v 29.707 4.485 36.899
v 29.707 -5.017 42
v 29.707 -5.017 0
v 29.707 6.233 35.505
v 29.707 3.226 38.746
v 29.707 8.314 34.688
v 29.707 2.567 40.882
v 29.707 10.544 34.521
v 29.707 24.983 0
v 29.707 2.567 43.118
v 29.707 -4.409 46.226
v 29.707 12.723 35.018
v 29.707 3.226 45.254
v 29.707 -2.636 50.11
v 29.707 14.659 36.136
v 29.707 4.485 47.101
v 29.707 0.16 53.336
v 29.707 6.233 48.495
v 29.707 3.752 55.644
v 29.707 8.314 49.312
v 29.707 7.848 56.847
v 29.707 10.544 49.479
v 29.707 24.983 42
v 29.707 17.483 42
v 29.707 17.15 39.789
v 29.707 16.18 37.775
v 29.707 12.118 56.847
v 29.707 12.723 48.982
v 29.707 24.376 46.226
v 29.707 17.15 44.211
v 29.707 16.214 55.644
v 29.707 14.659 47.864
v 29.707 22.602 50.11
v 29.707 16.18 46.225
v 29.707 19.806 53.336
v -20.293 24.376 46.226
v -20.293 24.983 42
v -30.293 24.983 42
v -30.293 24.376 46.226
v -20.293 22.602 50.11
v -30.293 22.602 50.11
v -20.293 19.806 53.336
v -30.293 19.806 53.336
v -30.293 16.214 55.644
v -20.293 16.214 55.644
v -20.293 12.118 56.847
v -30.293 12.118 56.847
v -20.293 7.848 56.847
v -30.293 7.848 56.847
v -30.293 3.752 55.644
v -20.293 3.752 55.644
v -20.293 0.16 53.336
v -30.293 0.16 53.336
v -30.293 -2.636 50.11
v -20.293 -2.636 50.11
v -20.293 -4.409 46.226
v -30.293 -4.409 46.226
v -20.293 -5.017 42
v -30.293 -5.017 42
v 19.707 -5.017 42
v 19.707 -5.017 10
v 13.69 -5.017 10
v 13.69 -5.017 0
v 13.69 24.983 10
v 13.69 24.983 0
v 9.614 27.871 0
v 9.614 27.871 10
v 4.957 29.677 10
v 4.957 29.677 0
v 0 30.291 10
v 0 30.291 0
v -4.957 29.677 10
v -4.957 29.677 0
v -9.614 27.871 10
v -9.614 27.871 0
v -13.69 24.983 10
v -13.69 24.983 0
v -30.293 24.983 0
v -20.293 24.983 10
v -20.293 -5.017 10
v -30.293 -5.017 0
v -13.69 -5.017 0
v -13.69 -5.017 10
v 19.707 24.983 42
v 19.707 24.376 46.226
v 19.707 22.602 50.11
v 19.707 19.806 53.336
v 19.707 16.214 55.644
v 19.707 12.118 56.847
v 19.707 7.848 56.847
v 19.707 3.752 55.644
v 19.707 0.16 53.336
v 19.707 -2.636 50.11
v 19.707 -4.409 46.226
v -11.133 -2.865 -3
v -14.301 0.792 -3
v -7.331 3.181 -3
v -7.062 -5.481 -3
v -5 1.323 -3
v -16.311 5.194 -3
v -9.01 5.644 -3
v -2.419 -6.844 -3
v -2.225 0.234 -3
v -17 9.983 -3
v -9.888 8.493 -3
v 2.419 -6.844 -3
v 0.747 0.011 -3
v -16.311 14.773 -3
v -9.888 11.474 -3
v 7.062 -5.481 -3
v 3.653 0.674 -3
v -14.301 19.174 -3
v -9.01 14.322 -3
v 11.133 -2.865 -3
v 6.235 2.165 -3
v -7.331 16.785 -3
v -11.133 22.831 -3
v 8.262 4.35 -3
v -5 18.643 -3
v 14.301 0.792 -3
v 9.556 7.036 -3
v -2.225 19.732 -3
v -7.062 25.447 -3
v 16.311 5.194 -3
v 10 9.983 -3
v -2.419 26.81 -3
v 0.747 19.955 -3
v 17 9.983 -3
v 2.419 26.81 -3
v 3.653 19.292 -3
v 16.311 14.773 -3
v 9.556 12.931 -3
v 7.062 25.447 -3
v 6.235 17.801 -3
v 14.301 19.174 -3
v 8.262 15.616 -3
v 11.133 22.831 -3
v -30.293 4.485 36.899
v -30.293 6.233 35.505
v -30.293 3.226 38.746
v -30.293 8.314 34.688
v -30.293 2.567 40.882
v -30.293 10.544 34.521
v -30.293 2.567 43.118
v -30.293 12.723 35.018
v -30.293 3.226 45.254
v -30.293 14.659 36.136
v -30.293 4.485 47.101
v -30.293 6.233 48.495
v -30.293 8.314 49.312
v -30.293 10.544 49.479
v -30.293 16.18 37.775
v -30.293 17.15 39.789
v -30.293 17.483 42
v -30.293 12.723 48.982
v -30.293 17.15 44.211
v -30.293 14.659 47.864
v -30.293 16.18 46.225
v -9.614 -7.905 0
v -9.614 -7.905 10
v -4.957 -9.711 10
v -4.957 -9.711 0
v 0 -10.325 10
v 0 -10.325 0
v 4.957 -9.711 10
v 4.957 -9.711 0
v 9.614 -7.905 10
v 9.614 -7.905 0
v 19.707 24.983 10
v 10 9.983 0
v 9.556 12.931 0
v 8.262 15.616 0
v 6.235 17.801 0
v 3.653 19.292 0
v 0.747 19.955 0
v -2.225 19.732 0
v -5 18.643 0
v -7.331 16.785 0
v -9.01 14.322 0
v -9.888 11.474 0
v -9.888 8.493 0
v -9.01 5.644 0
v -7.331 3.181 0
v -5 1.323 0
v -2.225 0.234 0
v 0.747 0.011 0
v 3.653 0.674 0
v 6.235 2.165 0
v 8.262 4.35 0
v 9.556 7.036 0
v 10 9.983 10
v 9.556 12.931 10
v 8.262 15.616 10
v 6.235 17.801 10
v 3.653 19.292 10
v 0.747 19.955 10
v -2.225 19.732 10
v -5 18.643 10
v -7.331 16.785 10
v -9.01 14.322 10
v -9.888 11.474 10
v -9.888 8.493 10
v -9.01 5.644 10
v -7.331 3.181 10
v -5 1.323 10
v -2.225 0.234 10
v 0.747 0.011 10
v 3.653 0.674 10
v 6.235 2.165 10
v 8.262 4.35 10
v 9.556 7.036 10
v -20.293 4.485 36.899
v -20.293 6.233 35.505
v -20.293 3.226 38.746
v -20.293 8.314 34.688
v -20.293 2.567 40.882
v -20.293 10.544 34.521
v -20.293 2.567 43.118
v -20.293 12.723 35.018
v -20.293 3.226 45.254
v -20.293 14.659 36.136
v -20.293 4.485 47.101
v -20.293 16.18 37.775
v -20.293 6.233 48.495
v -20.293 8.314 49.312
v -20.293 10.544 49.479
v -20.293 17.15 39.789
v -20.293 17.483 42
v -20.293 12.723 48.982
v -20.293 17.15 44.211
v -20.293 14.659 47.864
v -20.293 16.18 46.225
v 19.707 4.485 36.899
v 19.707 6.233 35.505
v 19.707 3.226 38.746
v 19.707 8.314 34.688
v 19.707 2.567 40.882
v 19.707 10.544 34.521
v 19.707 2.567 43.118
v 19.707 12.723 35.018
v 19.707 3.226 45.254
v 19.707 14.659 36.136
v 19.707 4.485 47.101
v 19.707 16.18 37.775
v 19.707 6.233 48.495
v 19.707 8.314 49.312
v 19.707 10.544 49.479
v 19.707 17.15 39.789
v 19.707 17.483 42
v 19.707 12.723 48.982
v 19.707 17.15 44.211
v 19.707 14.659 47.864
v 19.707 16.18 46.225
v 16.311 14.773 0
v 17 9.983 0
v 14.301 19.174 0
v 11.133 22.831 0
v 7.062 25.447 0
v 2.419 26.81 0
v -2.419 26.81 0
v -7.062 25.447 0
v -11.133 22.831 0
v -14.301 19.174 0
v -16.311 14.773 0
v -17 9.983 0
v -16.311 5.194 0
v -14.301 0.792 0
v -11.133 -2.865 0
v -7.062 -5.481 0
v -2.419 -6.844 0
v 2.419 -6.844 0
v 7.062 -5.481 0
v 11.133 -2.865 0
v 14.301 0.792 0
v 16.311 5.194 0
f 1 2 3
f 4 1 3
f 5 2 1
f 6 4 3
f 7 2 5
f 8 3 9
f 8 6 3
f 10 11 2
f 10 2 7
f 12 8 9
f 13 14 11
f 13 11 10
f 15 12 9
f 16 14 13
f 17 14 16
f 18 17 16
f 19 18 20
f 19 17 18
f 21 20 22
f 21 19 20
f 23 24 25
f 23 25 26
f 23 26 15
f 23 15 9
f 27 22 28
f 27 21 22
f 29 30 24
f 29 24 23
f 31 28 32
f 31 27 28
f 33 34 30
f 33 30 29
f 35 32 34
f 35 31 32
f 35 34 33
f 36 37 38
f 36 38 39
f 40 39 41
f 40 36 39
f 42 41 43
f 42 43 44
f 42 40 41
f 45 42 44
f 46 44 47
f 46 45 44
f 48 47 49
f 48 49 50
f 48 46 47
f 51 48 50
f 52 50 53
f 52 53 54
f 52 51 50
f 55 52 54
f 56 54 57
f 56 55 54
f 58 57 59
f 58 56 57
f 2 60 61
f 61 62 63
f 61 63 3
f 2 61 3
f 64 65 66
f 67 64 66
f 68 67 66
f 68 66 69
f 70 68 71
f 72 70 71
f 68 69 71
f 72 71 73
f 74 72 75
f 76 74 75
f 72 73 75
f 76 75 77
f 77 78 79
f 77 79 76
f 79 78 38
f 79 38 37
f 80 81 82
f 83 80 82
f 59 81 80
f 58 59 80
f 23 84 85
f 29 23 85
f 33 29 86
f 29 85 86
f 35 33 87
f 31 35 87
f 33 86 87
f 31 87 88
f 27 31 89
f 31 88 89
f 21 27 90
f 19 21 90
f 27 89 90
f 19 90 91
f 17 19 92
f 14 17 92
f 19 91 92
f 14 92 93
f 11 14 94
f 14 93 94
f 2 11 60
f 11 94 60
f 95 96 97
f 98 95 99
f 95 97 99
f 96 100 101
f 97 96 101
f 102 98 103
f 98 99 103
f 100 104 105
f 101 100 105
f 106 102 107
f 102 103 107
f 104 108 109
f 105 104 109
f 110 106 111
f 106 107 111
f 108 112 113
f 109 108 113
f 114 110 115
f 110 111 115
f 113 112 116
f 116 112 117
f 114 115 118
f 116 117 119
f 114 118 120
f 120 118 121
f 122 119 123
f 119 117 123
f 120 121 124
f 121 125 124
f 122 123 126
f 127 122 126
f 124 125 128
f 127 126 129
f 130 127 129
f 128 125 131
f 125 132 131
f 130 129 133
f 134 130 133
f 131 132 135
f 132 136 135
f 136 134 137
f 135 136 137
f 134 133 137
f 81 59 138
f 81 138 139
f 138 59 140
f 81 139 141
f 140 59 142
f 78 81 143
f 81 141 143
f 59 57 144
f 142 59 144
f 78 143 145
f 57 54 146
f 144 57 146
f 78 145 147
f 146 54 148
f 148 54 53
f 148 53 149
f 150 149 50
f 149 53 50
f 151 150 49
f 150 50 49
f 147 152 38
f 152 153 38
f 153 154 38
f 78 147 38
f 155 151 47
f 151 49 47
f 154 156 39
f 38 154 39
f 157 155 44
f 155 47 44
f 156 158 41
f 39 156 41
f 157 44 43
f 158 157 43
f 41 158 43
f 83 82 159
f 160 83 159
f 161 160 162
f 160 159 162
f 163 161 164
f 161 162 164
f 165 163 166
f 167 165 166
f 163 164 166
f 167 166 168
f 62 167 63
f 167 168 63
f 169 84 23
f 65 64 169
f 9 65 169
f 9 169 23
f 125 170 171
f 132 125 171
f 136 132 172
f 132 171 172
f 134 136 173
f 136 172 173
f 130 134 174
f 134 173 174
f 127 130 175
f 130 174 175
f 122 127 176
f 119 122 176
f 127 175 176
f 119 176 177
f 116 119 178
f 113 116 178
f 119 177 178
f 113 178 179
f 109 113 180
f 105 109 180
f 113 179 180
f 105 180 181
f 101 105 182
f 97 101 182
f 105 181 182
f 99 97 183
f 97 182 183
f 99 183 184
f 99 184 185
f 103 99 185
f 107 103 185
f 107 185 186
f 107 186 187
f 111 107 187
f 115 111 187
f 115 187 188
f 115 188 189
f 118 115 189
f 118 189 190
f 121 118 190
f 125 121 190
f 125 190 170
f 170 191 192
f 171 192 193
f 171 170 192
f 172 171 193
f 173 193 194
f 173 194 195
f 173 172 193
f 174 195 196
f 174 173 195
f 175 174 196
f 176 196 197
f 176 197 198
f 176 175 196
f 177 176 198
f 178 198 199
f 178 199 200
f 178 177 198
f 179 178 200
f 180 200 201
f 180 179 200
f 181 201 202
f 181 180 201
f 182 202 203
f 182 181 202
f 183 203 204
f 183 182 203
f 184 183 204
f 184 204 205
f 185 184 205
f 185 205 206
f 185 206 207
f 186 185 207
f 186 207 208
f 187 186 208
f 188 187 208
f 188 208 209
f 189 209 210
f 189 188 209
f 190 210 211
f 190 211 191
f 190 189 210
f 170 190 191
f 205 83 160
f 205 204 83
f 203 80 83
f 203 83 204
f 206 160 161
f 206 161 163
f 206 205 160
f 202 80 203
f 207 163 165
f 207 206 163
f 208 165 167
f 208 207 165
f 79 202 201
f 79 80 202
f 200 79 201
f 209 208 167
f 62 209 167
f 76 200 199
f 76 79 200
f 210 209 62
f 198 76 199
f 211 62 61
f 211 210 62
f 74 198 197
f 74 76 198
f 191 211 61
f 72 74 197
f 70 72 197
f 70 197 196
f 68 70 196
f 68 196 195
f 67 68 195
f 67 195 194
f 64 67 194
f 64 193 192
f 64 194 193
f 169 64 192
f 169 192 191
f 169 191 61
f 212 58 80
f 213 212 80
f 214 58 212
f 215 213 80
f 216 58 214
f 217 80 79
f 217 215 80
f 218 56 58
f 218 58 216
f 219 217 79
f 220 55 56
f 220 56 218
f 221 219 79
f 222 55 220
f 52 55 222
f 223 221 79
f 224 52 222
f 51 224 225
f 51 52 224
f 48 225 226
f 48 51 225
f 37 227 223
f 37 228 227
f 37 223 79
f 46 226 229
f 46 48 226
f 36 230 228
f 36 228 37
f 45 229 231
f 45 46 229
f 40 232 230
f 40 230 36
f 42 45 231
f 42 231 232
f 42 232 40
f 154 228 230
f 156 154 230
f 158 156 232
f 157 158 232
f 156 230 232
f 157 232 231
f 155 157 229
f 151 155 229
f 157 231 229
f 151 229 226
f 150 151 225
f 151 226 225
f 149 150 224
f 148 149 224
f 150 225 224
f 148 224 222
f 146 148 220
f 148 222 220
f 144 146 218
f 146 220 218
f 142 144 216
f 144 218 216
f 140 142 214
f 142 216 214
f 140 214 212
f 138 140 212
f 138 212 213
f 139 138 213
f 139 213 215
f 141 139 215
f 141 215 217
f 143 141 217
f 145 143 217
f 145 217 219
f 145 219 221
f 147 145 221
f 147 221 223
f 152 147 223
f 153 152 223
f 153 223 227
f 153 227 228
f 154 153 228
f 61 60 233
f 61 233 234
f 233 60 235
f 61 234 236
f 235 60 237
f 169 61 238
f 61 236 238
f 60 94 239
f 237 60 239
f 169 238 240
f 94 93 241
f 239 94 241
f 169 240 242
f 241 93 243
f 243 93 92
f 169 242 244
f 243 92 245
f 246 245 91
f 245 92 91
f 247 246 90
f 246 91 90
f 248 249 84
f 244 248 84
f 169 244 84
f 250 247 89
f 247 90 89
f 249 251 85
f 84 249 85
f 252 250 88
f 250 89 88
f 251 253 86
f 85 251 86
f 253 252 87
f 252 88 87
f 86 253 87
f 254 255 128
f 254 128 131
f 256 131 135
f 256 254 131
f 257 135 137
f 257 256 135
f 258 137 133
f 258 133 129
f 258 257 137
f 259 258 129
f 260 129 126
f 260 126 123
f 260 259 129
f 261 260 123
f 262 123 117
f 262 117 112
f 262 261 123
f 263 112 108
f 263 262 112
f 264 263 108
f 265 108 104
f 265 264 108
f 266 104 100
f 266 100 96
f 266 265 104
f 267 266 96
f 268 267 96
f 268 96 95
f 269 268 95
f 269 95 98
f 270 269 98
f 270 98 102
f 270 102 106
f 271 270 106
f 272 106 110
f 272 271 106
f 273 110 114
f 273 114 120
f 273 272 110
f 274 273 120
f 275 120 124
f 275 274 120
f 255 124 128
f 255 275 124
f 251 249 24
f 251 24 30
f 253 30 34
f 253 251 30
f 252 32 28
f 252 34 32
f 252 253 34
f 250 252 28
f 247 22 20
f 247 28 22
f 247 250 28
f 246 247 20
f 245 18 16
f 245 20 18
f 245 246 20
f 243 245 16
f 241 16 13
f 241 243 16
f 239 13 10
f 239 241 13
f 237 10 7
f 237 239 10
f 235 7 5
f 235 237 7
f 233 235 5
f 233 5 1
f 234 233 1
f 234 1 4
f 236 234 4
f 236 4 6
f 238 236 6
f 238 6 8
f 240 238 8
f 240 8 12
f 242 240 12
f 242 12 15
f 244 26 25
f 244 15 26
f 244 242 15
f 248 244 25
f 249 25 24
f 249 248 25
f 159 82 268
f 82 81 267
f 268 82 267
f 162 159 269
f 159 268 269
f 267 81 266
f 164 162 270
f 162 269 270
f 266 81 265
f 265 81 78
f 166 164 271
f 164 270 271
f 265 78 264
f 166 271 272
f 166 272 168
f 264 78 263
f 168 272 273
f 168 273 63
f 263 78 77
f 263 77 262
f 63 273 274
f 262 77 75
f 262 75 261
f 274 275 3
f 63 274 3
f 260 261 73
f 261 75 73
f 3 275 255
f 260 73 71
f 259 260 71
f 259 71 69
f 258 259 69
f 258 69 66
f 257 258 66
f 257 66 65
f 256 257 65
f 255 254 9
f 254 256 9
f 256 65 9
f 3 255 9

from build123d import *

# Parameters (mm, degrees)
F0_W           = 60
F0_H           = 30
F1_DEPTH       = 10
F2_R           = 10
F3_DEPTH       = 10
F4_R           = 10
F5_DEPTH       = 10
F5_DEPTH_BACK  = 17.75
F6_R           = 17
F7_DEPTH       = 3
F8_R           = 10
F9_DEPTH       = 25
F10_W          = 10
F10_H          = 32
F11_DEPTH      = 5.0168695525
F11_DEPTH_BACK = 24.9831304475
F13_START      = 19.7067023069
F13_DEPTH      = 10
F14_START      = -20.2932976931
F14_DEPTH      = 10
F15_R          = 7.5
F16_DEPTH      = 44.75
F16_DEPTH_BACK = 50.75


with BuildPart() as f1:
    # F0 (on Top) → F1 (new body)
    with BuildSketch(Plane.XY):
        with Locations((-0.2932976931, 9.9831304475)):
            Rectangle(F0_W, F0_H)
    extrude(amount=F1_DEPTH)

    # F2 (on Top) → F3 (join)
    with BuildSketch(Plane.XY):
        with BuildLine():
            ThreePointArc((13.6898891806, 24.9831304475), (0, 30.2910861737), (-13.6898891806, 24.9831304475))
            Line((-13.6898891806, 24.9831304475), (13.6898891806, 24.9831304475))
        make_face()
        with BuildLine():
            Line((13.6898891806, 24.9831304475), (-13.6898891806, 24.9831304475))
            ThreePointArc((-13.6898891806, 24.9831304475), (-18.2871818958, 18.8144408875), (-20.2599732919, 11.3783178851))
            ThreePointArc((-20.2599732919, 11.3783178851), (-18.8506984819, 2.4290433073), (-13.6898891806, -5.0168695525))
            Line((-13.6898891806, -5.0168695525), (13.6898891806, -5.0168695525))
            ThreePointArc((13.6898891806, -5.0168695525), (18.6883022663, 2.0357771662), (20.300634623, 10.52838239))
            ThreePointArc((20.300634623, 10.52838239), (18.4681851426, 18.4293842511), (13.6898891806, 24.9831304475))
        make_face()
        with Locations((0, 9.9831304475)):
            Circle(F2_R, mode=Mode.SUBTRACT)
        with BuildLine():
            Line((13.6898891806, -5.0168695525), (-13.6898891806, -5.0168695525))
            ThreePointArc((-13.6898891806, -5.0168695525), (0, -10.3248252786), (13.6898891806, -5.0168695525))
        make_face()
    extrude(amount=F3_DEPTH)

    # F4 (on Top) → F5 (cut, two sides)
    with BuildSketch(Plane.XY) as f5_sk:
        with Locations((0, 9.9831304475)):
            Circle(F4_R)
    extrude(amount=F5_DEPTH, mode=Mode.SUBTRACT)
    extrude(f5_sk.sketch, amount=-F5_DEPTH_BACK, mode=Mode.SUBTRACT)

    # F6 (on Top) → F7 (join)
    with BuildSketch(Plane.XY):
        with Locations((0, 9.9831304475)):
            Circle(F6_R)
    extrude(amount=-F7_DEPTH)

    # F8 (on Top) → F9 (cut)
    with BuildSketch(Plane.XY):
        with Locations((0, 9.9831304475)):
            Circle(F8_R)
    extrude(amount=-F9_DEPTH, mode=Mode.SUBTRACT)

    # F10 (on Front) → F11 (join, two sides)
    with BuildSketch(Plane.XZ) as f11_sk:
        with Locations((-25.2932976931, 26)):
            Rectangle(F10_W, F10_H)
        with Locations((24.7067023069, 26)):
            Rectangle(F10_W, F10_H)
    extrude(amount=F11_DEPTH)
    extrude(f11_sk.sketch, amount=-F11_DEPTH_BACK)

    # F12 (on Right) → F13 (join)
    with BuildSketch(Plane.YZ.offset(F13_START)):
        with BuildLine():
            ThreePointArc((24.9831304473, 42), (9.9831304473, 57), (-5.0168695527, 42))
            Line((-5.0168695527, 42), (24.9831304473, 42))
        make_face()
    extrude(amount=F13_DEPTH)

    # F12 (on Right) → F14 (join)
    with BuildSketch(Plane.YZ.offset(F14_START)):
        with BuildLine():
            ThreePointArc((24.9831304473, 42), (9.9831304473, 57), (-5.0168695527, 42))
            Line((-5.0168695527, 42), (24.9831304473, 42))
        make_face()
    extrude(amount=-F14_DEPTH)

    # F15 (on Right) → F16 (cut, two sides)
    with BuildSketch(Plane.YZ) as f16_sk:
        with Locations((9.9831304473, 42)):
            Circle(F15_R)
    extrude(amount=-F16_DEPTH, mode=Mode.SUBTRACT)
    extrude(f16_sk.sketch, amount=F16_DEPTH_BACK, mode=Mode.SUBTRACT)


solid = f1.part
